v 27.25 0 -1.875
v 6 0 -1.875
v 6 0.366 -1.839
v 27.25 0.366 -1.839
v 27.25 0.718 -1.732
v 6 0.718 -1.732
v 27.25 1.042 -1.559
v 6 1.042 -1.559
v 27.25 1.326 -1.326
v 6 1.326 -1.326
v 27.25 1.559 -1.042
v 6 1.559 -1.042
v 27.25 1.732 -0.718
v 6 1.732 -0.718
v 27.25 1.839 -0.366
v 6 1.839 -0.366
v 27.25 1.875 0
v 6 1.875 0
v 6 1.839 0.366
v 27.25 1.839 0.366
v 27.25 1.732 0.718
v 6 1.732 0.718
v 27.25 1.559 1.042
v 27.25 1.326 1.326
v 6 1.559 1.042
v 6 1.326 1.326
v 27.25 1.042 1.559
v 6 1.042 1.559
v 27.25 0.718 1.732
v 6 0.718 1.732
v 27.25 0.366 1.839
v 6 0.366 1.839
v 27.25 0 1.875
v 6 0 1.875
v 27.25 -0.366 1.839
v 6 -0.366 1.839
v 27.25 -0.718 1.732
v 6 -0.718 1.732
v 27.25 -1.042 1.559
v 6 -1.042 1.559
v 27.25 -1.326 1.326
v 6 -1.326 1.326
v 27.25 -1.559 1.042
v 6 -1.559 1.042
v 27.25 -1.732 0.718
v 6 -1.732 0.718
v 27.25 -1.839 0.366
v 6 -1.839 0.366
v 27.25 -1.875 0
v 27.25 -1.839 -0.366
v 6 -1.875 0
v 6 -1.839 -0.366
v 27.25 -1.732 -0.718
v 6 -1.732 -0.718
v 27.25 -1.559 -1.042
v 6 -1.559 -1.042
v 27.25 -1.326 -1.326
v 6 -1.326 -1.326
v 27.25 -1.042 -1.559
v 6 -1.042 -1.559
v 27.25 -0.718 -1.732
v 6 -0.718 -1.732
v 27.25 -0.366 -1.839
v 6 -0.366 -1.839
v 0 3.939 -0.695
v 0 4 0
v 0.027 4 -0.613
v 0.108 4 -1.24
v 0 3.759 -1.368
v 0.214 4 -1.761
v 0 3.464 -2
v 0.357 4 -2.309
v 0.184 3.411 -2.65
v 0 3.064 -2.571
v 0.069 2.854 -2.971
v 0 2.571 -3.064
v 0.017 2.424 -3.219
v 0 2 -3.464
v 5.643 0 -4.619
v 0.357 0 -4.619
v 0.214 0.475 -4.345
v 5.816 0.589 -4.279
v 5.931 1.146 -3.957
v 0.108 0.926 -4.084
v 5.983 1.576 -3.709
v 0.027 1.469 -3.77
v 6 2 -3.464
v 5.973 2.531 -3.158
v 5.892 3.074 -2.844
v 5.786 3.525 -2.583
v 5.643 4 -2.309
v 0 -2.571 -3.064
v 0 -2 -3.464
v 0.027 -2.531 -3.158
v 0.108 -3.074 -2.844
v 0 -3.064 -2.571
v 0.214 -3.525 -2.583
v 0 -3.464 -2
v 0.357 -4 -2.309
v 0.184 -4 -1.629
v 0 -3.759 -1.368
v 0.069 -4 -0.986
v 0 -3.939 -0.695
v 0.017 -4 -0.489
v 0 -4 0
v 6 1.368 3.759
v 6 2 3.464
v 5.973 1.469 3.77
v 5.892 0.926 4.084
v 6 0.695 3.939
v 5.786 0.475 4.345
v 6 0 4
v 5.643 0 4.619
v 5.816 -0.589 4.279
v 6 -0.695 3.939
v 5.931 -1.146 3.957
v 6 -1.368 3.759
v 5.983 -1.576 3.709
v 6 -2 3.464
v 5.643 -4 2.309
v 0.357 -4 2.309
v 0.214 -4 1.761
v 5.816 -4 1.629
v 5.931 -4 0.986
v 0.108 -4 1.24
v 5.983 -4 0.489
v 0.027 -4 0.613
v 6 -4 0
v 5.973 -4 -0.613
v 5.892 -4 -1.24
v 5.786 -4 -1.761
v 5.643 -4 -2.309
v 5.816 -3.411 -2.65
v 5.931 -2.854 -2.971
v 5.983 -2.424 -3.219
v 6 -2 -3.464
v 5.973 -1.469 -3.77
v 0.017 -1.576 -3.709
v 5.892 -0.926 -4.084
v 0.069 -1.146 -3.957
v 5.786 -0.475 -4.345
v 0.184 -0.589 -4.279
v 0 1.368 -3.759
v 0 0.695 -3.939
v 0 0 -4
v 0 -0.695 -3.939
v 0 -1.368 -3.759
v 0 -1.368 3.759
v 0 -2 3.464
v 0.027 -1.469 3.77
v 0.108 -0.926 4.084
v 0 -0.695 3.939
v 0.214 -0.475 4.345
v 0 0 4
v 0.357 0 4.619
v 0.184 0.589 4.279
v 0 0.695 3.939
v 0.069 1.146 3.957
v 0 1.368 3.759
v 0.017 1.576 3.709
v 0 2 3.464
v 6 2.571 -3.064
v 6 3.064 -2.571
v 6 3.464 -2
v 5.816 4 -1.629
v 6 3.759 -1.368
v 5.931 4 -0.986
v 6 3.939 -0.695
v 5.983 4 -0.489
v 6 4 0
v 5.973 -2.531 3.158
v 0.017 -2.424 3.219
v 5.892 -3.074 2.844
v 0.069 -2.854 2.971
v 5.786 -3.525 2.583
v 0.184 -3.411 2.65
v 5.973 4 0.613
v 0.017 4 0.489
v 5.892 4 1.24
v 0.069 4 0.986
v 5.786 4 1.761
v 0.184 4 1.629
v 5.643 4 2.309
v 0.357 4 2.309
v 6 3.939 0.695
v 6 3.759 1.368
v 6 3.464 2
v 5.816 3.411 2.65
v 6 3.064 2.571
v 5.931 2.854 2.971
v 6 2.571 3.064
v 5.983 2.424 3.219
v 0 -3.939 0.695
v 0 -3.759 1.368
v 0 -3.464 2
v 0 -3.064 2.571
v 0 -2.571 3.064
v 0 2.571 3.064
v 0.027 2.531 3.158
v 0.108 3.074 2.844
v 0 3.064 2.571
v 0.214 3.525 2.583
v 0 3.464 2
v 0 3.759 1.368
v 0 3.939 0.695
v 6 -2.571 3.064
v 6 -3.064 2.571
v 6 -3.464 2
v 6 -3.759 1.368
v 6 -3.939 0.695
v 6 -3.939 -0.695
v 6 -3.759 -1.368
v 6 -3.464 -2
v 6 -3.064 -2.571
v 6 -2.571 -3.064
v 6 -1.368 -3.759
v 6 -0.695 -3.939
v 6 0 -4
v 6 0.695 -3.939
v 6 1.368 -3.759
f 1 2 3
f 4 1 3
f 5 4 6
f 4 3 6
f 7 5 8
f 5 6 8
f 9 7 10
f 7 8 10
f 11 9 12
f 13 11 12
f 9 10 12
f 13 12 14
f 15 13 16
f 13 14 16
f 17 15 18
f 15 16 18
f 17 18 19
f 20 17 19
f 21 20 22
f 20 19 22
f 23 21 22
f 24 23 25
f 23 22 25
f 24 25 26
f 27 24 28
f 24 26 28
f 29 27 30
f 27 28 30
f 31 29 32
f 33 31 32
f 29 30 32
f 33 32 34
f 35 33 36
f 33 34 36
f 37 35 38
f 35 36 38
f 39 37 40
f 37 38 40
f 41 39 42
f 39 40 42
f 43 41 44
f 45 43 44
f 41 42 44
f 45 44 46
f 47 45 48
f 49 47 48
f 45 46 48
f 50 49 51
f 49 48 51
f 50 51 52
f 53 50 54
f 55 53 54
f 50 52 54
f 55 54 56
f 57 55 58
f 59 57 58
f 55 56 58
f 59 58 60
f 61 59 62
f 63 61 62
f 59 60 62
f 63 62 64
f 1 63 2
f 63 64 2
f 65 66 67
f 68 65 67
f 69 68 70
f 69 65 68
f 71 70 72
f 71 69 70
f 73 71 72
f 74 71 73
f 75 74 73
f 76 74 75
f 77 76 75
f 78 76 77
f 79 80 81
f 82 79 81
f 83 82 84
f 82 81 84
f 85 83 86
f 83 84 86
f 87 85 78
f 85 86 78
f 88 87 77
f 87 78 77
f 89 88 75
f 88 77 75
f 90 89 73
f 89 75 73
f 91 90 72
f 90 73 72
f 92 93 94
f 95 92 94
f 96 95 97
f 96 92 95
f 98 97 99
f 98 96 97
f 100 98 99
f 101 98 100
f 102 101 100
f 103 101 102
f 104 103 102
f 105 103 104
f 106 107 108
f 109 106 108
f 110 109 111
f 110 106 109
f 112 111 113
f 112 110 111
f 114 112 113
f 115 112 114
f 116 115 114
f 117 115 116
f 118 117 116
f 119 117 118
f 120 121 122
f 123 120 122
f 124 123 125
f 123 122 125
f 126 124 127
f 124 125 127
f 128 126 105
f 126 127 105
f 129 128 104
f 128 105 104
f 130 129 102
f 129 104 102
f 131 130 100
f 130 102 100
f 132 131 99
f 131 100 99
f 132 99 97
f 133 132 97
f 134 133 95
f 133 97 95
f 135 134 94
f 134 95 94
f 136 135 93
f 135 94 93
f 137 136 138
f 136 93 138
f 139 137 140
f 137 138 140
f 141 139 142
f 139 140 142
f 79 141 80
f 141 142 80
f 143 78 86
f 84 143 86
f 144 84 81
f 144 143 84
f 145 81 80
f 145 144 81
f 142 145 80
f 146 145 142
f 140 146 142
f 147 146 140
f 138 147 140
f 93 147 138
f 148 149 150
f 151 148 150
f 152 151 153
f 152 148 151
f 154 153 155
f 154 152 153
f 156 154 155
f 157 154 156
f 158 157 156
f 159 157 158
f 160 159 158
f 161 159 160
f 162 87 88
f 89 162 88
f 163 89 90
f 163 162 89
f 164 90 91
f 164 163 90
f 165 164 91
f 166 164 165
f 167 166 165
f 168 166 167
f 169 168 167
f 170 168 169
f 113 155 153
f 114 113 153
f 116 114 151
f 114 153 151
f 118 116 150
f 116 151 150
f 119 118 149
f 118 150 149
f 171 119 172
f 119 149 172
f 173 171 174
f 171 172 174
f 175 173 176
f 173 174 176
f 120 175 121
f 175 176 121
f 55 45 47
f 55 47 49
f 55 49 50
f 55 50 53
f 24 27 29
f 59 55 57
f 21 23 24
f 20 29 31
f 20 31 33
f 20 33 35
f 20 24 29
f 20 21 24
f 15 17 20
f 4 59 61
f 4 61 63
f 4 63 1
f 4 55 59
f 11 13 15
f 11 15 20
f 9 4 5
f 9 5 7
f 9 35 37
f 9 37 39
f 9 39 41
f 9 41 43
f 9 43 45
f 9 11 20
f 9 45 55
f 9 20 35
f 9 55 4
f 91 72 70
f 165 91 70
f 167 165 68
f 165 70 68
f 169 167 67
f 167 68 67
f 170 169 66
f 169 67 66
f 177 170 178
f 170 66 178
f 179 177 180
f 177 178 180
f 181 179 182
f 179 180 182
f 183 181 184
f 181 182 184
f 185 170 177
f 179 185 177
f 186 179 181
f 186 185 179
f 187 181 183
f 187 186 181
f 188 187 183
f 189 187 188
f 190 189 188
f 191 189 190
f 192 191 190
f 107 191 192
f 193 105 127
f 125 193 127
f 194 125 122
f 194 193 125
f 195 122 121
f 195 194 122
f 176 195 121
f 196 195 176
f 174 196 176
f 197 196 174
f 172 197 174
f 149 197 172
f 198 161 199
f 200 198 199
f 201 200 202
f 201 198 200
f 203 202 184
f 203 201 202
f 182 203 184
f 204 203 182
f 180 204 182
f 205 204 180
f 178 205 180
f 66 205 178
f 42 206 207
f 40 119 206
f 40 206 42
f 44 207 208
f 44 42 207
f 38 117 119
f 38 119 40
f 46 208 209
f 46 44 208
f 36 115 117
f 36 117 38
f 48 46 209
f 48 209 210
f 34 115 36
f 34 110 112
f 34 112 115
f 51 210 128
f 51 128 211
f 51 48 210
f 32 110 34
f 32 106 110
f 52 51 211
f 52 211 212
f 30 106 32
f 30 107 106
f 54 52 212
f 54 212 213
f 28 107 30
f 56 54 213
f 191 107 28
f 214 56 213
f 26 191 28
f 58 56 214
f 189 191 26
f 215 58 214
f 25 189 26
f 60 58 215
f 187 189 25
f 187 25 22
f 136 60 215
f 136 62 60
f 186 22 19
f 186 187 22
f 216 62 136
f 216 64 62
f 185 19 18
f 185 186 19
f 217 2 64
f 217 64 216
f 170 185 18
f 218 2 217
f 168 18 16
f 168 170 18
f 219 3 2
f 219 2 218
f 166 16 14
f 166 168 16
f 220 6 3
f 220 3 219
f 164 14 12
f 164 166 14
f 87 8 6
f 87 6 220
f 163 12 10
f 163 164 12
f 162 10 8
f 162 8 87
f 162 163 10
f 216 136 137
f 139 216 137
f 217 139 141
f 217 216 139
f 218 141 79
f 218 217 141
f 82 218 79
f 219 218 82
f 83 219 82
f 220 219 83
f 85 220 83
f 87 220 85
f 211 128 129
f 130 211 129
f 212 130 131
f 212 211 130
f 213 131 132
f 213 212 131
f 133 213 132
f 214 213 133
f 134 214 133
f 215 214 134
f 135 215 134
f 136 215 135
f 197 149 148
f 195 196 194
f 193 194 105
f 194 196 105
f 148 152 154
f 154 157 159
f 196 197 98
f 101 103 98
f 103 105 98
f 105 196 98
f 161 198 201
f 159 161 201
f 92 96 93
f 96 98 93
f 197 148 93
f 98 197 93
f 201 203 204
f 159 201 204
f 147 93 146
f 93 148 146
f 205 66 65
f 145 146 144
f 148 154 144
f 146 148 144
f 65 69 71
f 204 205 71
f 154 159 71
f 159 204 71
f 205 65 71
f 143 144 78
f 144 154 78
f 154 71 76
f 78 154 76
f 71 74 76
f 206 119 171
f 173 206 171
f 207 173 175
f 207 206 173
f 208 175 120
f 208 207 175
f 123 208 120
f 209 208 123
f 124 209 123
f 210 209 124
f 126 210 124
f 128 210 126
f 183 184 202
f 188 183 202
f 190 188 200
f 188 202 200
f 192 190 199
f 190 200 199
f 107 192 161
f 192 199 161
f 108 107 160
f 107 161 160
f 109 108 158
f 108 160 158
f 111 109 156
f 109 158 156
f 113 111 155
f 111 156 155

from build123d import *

# Parameters (mm, degrees)
Y_KSEKLIK_EKSTR_ZYON1_DEPTH = 6
IZIM2_R                     = 1.875
Y_KSEKLIK_EKSTR_ZYON2_DEPTH = 21.25
IZIM3_OUTSIDE_W             = 51.852
IZIM3_OUTSIDE_H             = 50.614
IZIM3_OUTSIDE_R             = 4
KES_EKSTR_ZYON1_DEPTH       = 10
KES_EKSTR_ZYON1_DRAFT       = -60
IZIM4_OUTSIDE_W             = 51.852
IZIM4_OUTSIDE_H             = 50.614
IZIM4_OUTSIDE_R             = 4
KES_EKSTR_ZYON2_DEPTH       = 10
KES_EKSTR_ZYON2_DRAFT       = -60


with BuildPart() as part:
    # Çizim1 → Yükseklik-Ekstrüzyon1 (new body)
    with BuildSketch(Plane(origin=(0, 0, 0), x_dir=(0, 0, -1), z_dir=(1, 0, 0))):
        Polygon((4.618802154, 0), (2.309401077, 4), (-2.309401077, 4), (-4.618802154, 0), (-2.309401077, -4), (2.309401077, -4), align=None)
    extrude(amount=Y_KSEKLIK_EKSTR_ZYON1_DEPTH)

    # Çizim2 → Yükseklik-Ekstrüzyon2 (add)
    with BuildSketch(Plane(origin=(6, 0, 0), x_dir=(0, 0, -1), z_dir=(1, 0, 0))):
        Circle(IZIM2_R)
    extrude(amount=Y_KSEKLIK_EKSTR_ZYON2_DEPTH)


with BuildPart() as kes_ekstr_zyon1_tool:
    # Çizim3 outside → Kes-Ekstrüzyon1 (with draft: the straight prism first)
    with BuildSketch(Plane(origin=(6, 0, 0), x_dir=(0, 0, -1), z_dir=(1, 0, 0))):
        Rectangle(IZIM3_OUTSIDE_W, IZIM3_OUTSIDE_H)
        Circle(IZIM3_OUTSIDE_R, mode=Mode.SUBTRACT)
    extrude(amount=-KES_EKSTR_ZYON1_DEPTH)
    # Kes-Ekstrüzyon1: the draft: its side faces are tilted about the plane it starts from
    kes_ekstr_zyon1_sides = [kes_ekstr_zyon1_tool.faces().sort_by_distance(p)[0] for p in [
        (1, -25.307, 0),
        (1, 0, -25.926),
        (1, 25.307, 0),
        (1, 0, 25.926),
        (1, 0, 4),
    ]]
    draft(kes_ekstr_zyon1_sides, Plane(origin=(6, 0, 0), x_dir=(0, 0, -1), z_dir=(1, 0, 0)), KES_EKSTR_ZYON1_DRAFT)


with BuildPart() as part_1:
    add(part.part)

    # Kes-Ekstrüzyon1: cut by kes_ekstr_zyon1_tool
    add(kes_ekstr_zyon1_tool.part, mode=Mode.SUBTRACT)


with BuildPart() as kes_ekstr_zyon2_tool:
    # Çizim4 outside → Kes-Ekstrüzyon2 (with draft: the straight prism first)
    with BuildSketch(Plane.ZY):
        Rectangle(IZIM4_OUTSIDE_W, IZIM4_OUTSIDE_H)
        Circle(IZIM4_OUTSIDE_R, mode=Mode.SUBTRACT)
    extrude(amount=-KES_EKSTR_ZYON2_DEPTH)
    # Kes-Ekstrüzyon2: the draft: its side faces are tilted about the plane it starts from
    kes_ekstr_zyon2_sides = [kes_ekstr_zyon2_tool.faces().sort_by_distance(p)[0] for p in [
        (5, -25.307, 0),
        (5, 0, 25.926),
        (5, 25.307, 0),
        (5, 0, -25.926),
        (5, 0, -4),
    ]]
    draft(kes_ekstr_zyon2_sides, Plane.ZY, KES_EKSTR_ZYON2_DRAFT)


with BuildPart() as part_2:
    add(part_1.part)

    # Kes-Ekstrüzyon2: cut by kes_ekstr_zyon2_tool
    add(kes_ekstr_zyon2_tool.part, mode=Mode.SUBTRACT)


solid = part_2.part
